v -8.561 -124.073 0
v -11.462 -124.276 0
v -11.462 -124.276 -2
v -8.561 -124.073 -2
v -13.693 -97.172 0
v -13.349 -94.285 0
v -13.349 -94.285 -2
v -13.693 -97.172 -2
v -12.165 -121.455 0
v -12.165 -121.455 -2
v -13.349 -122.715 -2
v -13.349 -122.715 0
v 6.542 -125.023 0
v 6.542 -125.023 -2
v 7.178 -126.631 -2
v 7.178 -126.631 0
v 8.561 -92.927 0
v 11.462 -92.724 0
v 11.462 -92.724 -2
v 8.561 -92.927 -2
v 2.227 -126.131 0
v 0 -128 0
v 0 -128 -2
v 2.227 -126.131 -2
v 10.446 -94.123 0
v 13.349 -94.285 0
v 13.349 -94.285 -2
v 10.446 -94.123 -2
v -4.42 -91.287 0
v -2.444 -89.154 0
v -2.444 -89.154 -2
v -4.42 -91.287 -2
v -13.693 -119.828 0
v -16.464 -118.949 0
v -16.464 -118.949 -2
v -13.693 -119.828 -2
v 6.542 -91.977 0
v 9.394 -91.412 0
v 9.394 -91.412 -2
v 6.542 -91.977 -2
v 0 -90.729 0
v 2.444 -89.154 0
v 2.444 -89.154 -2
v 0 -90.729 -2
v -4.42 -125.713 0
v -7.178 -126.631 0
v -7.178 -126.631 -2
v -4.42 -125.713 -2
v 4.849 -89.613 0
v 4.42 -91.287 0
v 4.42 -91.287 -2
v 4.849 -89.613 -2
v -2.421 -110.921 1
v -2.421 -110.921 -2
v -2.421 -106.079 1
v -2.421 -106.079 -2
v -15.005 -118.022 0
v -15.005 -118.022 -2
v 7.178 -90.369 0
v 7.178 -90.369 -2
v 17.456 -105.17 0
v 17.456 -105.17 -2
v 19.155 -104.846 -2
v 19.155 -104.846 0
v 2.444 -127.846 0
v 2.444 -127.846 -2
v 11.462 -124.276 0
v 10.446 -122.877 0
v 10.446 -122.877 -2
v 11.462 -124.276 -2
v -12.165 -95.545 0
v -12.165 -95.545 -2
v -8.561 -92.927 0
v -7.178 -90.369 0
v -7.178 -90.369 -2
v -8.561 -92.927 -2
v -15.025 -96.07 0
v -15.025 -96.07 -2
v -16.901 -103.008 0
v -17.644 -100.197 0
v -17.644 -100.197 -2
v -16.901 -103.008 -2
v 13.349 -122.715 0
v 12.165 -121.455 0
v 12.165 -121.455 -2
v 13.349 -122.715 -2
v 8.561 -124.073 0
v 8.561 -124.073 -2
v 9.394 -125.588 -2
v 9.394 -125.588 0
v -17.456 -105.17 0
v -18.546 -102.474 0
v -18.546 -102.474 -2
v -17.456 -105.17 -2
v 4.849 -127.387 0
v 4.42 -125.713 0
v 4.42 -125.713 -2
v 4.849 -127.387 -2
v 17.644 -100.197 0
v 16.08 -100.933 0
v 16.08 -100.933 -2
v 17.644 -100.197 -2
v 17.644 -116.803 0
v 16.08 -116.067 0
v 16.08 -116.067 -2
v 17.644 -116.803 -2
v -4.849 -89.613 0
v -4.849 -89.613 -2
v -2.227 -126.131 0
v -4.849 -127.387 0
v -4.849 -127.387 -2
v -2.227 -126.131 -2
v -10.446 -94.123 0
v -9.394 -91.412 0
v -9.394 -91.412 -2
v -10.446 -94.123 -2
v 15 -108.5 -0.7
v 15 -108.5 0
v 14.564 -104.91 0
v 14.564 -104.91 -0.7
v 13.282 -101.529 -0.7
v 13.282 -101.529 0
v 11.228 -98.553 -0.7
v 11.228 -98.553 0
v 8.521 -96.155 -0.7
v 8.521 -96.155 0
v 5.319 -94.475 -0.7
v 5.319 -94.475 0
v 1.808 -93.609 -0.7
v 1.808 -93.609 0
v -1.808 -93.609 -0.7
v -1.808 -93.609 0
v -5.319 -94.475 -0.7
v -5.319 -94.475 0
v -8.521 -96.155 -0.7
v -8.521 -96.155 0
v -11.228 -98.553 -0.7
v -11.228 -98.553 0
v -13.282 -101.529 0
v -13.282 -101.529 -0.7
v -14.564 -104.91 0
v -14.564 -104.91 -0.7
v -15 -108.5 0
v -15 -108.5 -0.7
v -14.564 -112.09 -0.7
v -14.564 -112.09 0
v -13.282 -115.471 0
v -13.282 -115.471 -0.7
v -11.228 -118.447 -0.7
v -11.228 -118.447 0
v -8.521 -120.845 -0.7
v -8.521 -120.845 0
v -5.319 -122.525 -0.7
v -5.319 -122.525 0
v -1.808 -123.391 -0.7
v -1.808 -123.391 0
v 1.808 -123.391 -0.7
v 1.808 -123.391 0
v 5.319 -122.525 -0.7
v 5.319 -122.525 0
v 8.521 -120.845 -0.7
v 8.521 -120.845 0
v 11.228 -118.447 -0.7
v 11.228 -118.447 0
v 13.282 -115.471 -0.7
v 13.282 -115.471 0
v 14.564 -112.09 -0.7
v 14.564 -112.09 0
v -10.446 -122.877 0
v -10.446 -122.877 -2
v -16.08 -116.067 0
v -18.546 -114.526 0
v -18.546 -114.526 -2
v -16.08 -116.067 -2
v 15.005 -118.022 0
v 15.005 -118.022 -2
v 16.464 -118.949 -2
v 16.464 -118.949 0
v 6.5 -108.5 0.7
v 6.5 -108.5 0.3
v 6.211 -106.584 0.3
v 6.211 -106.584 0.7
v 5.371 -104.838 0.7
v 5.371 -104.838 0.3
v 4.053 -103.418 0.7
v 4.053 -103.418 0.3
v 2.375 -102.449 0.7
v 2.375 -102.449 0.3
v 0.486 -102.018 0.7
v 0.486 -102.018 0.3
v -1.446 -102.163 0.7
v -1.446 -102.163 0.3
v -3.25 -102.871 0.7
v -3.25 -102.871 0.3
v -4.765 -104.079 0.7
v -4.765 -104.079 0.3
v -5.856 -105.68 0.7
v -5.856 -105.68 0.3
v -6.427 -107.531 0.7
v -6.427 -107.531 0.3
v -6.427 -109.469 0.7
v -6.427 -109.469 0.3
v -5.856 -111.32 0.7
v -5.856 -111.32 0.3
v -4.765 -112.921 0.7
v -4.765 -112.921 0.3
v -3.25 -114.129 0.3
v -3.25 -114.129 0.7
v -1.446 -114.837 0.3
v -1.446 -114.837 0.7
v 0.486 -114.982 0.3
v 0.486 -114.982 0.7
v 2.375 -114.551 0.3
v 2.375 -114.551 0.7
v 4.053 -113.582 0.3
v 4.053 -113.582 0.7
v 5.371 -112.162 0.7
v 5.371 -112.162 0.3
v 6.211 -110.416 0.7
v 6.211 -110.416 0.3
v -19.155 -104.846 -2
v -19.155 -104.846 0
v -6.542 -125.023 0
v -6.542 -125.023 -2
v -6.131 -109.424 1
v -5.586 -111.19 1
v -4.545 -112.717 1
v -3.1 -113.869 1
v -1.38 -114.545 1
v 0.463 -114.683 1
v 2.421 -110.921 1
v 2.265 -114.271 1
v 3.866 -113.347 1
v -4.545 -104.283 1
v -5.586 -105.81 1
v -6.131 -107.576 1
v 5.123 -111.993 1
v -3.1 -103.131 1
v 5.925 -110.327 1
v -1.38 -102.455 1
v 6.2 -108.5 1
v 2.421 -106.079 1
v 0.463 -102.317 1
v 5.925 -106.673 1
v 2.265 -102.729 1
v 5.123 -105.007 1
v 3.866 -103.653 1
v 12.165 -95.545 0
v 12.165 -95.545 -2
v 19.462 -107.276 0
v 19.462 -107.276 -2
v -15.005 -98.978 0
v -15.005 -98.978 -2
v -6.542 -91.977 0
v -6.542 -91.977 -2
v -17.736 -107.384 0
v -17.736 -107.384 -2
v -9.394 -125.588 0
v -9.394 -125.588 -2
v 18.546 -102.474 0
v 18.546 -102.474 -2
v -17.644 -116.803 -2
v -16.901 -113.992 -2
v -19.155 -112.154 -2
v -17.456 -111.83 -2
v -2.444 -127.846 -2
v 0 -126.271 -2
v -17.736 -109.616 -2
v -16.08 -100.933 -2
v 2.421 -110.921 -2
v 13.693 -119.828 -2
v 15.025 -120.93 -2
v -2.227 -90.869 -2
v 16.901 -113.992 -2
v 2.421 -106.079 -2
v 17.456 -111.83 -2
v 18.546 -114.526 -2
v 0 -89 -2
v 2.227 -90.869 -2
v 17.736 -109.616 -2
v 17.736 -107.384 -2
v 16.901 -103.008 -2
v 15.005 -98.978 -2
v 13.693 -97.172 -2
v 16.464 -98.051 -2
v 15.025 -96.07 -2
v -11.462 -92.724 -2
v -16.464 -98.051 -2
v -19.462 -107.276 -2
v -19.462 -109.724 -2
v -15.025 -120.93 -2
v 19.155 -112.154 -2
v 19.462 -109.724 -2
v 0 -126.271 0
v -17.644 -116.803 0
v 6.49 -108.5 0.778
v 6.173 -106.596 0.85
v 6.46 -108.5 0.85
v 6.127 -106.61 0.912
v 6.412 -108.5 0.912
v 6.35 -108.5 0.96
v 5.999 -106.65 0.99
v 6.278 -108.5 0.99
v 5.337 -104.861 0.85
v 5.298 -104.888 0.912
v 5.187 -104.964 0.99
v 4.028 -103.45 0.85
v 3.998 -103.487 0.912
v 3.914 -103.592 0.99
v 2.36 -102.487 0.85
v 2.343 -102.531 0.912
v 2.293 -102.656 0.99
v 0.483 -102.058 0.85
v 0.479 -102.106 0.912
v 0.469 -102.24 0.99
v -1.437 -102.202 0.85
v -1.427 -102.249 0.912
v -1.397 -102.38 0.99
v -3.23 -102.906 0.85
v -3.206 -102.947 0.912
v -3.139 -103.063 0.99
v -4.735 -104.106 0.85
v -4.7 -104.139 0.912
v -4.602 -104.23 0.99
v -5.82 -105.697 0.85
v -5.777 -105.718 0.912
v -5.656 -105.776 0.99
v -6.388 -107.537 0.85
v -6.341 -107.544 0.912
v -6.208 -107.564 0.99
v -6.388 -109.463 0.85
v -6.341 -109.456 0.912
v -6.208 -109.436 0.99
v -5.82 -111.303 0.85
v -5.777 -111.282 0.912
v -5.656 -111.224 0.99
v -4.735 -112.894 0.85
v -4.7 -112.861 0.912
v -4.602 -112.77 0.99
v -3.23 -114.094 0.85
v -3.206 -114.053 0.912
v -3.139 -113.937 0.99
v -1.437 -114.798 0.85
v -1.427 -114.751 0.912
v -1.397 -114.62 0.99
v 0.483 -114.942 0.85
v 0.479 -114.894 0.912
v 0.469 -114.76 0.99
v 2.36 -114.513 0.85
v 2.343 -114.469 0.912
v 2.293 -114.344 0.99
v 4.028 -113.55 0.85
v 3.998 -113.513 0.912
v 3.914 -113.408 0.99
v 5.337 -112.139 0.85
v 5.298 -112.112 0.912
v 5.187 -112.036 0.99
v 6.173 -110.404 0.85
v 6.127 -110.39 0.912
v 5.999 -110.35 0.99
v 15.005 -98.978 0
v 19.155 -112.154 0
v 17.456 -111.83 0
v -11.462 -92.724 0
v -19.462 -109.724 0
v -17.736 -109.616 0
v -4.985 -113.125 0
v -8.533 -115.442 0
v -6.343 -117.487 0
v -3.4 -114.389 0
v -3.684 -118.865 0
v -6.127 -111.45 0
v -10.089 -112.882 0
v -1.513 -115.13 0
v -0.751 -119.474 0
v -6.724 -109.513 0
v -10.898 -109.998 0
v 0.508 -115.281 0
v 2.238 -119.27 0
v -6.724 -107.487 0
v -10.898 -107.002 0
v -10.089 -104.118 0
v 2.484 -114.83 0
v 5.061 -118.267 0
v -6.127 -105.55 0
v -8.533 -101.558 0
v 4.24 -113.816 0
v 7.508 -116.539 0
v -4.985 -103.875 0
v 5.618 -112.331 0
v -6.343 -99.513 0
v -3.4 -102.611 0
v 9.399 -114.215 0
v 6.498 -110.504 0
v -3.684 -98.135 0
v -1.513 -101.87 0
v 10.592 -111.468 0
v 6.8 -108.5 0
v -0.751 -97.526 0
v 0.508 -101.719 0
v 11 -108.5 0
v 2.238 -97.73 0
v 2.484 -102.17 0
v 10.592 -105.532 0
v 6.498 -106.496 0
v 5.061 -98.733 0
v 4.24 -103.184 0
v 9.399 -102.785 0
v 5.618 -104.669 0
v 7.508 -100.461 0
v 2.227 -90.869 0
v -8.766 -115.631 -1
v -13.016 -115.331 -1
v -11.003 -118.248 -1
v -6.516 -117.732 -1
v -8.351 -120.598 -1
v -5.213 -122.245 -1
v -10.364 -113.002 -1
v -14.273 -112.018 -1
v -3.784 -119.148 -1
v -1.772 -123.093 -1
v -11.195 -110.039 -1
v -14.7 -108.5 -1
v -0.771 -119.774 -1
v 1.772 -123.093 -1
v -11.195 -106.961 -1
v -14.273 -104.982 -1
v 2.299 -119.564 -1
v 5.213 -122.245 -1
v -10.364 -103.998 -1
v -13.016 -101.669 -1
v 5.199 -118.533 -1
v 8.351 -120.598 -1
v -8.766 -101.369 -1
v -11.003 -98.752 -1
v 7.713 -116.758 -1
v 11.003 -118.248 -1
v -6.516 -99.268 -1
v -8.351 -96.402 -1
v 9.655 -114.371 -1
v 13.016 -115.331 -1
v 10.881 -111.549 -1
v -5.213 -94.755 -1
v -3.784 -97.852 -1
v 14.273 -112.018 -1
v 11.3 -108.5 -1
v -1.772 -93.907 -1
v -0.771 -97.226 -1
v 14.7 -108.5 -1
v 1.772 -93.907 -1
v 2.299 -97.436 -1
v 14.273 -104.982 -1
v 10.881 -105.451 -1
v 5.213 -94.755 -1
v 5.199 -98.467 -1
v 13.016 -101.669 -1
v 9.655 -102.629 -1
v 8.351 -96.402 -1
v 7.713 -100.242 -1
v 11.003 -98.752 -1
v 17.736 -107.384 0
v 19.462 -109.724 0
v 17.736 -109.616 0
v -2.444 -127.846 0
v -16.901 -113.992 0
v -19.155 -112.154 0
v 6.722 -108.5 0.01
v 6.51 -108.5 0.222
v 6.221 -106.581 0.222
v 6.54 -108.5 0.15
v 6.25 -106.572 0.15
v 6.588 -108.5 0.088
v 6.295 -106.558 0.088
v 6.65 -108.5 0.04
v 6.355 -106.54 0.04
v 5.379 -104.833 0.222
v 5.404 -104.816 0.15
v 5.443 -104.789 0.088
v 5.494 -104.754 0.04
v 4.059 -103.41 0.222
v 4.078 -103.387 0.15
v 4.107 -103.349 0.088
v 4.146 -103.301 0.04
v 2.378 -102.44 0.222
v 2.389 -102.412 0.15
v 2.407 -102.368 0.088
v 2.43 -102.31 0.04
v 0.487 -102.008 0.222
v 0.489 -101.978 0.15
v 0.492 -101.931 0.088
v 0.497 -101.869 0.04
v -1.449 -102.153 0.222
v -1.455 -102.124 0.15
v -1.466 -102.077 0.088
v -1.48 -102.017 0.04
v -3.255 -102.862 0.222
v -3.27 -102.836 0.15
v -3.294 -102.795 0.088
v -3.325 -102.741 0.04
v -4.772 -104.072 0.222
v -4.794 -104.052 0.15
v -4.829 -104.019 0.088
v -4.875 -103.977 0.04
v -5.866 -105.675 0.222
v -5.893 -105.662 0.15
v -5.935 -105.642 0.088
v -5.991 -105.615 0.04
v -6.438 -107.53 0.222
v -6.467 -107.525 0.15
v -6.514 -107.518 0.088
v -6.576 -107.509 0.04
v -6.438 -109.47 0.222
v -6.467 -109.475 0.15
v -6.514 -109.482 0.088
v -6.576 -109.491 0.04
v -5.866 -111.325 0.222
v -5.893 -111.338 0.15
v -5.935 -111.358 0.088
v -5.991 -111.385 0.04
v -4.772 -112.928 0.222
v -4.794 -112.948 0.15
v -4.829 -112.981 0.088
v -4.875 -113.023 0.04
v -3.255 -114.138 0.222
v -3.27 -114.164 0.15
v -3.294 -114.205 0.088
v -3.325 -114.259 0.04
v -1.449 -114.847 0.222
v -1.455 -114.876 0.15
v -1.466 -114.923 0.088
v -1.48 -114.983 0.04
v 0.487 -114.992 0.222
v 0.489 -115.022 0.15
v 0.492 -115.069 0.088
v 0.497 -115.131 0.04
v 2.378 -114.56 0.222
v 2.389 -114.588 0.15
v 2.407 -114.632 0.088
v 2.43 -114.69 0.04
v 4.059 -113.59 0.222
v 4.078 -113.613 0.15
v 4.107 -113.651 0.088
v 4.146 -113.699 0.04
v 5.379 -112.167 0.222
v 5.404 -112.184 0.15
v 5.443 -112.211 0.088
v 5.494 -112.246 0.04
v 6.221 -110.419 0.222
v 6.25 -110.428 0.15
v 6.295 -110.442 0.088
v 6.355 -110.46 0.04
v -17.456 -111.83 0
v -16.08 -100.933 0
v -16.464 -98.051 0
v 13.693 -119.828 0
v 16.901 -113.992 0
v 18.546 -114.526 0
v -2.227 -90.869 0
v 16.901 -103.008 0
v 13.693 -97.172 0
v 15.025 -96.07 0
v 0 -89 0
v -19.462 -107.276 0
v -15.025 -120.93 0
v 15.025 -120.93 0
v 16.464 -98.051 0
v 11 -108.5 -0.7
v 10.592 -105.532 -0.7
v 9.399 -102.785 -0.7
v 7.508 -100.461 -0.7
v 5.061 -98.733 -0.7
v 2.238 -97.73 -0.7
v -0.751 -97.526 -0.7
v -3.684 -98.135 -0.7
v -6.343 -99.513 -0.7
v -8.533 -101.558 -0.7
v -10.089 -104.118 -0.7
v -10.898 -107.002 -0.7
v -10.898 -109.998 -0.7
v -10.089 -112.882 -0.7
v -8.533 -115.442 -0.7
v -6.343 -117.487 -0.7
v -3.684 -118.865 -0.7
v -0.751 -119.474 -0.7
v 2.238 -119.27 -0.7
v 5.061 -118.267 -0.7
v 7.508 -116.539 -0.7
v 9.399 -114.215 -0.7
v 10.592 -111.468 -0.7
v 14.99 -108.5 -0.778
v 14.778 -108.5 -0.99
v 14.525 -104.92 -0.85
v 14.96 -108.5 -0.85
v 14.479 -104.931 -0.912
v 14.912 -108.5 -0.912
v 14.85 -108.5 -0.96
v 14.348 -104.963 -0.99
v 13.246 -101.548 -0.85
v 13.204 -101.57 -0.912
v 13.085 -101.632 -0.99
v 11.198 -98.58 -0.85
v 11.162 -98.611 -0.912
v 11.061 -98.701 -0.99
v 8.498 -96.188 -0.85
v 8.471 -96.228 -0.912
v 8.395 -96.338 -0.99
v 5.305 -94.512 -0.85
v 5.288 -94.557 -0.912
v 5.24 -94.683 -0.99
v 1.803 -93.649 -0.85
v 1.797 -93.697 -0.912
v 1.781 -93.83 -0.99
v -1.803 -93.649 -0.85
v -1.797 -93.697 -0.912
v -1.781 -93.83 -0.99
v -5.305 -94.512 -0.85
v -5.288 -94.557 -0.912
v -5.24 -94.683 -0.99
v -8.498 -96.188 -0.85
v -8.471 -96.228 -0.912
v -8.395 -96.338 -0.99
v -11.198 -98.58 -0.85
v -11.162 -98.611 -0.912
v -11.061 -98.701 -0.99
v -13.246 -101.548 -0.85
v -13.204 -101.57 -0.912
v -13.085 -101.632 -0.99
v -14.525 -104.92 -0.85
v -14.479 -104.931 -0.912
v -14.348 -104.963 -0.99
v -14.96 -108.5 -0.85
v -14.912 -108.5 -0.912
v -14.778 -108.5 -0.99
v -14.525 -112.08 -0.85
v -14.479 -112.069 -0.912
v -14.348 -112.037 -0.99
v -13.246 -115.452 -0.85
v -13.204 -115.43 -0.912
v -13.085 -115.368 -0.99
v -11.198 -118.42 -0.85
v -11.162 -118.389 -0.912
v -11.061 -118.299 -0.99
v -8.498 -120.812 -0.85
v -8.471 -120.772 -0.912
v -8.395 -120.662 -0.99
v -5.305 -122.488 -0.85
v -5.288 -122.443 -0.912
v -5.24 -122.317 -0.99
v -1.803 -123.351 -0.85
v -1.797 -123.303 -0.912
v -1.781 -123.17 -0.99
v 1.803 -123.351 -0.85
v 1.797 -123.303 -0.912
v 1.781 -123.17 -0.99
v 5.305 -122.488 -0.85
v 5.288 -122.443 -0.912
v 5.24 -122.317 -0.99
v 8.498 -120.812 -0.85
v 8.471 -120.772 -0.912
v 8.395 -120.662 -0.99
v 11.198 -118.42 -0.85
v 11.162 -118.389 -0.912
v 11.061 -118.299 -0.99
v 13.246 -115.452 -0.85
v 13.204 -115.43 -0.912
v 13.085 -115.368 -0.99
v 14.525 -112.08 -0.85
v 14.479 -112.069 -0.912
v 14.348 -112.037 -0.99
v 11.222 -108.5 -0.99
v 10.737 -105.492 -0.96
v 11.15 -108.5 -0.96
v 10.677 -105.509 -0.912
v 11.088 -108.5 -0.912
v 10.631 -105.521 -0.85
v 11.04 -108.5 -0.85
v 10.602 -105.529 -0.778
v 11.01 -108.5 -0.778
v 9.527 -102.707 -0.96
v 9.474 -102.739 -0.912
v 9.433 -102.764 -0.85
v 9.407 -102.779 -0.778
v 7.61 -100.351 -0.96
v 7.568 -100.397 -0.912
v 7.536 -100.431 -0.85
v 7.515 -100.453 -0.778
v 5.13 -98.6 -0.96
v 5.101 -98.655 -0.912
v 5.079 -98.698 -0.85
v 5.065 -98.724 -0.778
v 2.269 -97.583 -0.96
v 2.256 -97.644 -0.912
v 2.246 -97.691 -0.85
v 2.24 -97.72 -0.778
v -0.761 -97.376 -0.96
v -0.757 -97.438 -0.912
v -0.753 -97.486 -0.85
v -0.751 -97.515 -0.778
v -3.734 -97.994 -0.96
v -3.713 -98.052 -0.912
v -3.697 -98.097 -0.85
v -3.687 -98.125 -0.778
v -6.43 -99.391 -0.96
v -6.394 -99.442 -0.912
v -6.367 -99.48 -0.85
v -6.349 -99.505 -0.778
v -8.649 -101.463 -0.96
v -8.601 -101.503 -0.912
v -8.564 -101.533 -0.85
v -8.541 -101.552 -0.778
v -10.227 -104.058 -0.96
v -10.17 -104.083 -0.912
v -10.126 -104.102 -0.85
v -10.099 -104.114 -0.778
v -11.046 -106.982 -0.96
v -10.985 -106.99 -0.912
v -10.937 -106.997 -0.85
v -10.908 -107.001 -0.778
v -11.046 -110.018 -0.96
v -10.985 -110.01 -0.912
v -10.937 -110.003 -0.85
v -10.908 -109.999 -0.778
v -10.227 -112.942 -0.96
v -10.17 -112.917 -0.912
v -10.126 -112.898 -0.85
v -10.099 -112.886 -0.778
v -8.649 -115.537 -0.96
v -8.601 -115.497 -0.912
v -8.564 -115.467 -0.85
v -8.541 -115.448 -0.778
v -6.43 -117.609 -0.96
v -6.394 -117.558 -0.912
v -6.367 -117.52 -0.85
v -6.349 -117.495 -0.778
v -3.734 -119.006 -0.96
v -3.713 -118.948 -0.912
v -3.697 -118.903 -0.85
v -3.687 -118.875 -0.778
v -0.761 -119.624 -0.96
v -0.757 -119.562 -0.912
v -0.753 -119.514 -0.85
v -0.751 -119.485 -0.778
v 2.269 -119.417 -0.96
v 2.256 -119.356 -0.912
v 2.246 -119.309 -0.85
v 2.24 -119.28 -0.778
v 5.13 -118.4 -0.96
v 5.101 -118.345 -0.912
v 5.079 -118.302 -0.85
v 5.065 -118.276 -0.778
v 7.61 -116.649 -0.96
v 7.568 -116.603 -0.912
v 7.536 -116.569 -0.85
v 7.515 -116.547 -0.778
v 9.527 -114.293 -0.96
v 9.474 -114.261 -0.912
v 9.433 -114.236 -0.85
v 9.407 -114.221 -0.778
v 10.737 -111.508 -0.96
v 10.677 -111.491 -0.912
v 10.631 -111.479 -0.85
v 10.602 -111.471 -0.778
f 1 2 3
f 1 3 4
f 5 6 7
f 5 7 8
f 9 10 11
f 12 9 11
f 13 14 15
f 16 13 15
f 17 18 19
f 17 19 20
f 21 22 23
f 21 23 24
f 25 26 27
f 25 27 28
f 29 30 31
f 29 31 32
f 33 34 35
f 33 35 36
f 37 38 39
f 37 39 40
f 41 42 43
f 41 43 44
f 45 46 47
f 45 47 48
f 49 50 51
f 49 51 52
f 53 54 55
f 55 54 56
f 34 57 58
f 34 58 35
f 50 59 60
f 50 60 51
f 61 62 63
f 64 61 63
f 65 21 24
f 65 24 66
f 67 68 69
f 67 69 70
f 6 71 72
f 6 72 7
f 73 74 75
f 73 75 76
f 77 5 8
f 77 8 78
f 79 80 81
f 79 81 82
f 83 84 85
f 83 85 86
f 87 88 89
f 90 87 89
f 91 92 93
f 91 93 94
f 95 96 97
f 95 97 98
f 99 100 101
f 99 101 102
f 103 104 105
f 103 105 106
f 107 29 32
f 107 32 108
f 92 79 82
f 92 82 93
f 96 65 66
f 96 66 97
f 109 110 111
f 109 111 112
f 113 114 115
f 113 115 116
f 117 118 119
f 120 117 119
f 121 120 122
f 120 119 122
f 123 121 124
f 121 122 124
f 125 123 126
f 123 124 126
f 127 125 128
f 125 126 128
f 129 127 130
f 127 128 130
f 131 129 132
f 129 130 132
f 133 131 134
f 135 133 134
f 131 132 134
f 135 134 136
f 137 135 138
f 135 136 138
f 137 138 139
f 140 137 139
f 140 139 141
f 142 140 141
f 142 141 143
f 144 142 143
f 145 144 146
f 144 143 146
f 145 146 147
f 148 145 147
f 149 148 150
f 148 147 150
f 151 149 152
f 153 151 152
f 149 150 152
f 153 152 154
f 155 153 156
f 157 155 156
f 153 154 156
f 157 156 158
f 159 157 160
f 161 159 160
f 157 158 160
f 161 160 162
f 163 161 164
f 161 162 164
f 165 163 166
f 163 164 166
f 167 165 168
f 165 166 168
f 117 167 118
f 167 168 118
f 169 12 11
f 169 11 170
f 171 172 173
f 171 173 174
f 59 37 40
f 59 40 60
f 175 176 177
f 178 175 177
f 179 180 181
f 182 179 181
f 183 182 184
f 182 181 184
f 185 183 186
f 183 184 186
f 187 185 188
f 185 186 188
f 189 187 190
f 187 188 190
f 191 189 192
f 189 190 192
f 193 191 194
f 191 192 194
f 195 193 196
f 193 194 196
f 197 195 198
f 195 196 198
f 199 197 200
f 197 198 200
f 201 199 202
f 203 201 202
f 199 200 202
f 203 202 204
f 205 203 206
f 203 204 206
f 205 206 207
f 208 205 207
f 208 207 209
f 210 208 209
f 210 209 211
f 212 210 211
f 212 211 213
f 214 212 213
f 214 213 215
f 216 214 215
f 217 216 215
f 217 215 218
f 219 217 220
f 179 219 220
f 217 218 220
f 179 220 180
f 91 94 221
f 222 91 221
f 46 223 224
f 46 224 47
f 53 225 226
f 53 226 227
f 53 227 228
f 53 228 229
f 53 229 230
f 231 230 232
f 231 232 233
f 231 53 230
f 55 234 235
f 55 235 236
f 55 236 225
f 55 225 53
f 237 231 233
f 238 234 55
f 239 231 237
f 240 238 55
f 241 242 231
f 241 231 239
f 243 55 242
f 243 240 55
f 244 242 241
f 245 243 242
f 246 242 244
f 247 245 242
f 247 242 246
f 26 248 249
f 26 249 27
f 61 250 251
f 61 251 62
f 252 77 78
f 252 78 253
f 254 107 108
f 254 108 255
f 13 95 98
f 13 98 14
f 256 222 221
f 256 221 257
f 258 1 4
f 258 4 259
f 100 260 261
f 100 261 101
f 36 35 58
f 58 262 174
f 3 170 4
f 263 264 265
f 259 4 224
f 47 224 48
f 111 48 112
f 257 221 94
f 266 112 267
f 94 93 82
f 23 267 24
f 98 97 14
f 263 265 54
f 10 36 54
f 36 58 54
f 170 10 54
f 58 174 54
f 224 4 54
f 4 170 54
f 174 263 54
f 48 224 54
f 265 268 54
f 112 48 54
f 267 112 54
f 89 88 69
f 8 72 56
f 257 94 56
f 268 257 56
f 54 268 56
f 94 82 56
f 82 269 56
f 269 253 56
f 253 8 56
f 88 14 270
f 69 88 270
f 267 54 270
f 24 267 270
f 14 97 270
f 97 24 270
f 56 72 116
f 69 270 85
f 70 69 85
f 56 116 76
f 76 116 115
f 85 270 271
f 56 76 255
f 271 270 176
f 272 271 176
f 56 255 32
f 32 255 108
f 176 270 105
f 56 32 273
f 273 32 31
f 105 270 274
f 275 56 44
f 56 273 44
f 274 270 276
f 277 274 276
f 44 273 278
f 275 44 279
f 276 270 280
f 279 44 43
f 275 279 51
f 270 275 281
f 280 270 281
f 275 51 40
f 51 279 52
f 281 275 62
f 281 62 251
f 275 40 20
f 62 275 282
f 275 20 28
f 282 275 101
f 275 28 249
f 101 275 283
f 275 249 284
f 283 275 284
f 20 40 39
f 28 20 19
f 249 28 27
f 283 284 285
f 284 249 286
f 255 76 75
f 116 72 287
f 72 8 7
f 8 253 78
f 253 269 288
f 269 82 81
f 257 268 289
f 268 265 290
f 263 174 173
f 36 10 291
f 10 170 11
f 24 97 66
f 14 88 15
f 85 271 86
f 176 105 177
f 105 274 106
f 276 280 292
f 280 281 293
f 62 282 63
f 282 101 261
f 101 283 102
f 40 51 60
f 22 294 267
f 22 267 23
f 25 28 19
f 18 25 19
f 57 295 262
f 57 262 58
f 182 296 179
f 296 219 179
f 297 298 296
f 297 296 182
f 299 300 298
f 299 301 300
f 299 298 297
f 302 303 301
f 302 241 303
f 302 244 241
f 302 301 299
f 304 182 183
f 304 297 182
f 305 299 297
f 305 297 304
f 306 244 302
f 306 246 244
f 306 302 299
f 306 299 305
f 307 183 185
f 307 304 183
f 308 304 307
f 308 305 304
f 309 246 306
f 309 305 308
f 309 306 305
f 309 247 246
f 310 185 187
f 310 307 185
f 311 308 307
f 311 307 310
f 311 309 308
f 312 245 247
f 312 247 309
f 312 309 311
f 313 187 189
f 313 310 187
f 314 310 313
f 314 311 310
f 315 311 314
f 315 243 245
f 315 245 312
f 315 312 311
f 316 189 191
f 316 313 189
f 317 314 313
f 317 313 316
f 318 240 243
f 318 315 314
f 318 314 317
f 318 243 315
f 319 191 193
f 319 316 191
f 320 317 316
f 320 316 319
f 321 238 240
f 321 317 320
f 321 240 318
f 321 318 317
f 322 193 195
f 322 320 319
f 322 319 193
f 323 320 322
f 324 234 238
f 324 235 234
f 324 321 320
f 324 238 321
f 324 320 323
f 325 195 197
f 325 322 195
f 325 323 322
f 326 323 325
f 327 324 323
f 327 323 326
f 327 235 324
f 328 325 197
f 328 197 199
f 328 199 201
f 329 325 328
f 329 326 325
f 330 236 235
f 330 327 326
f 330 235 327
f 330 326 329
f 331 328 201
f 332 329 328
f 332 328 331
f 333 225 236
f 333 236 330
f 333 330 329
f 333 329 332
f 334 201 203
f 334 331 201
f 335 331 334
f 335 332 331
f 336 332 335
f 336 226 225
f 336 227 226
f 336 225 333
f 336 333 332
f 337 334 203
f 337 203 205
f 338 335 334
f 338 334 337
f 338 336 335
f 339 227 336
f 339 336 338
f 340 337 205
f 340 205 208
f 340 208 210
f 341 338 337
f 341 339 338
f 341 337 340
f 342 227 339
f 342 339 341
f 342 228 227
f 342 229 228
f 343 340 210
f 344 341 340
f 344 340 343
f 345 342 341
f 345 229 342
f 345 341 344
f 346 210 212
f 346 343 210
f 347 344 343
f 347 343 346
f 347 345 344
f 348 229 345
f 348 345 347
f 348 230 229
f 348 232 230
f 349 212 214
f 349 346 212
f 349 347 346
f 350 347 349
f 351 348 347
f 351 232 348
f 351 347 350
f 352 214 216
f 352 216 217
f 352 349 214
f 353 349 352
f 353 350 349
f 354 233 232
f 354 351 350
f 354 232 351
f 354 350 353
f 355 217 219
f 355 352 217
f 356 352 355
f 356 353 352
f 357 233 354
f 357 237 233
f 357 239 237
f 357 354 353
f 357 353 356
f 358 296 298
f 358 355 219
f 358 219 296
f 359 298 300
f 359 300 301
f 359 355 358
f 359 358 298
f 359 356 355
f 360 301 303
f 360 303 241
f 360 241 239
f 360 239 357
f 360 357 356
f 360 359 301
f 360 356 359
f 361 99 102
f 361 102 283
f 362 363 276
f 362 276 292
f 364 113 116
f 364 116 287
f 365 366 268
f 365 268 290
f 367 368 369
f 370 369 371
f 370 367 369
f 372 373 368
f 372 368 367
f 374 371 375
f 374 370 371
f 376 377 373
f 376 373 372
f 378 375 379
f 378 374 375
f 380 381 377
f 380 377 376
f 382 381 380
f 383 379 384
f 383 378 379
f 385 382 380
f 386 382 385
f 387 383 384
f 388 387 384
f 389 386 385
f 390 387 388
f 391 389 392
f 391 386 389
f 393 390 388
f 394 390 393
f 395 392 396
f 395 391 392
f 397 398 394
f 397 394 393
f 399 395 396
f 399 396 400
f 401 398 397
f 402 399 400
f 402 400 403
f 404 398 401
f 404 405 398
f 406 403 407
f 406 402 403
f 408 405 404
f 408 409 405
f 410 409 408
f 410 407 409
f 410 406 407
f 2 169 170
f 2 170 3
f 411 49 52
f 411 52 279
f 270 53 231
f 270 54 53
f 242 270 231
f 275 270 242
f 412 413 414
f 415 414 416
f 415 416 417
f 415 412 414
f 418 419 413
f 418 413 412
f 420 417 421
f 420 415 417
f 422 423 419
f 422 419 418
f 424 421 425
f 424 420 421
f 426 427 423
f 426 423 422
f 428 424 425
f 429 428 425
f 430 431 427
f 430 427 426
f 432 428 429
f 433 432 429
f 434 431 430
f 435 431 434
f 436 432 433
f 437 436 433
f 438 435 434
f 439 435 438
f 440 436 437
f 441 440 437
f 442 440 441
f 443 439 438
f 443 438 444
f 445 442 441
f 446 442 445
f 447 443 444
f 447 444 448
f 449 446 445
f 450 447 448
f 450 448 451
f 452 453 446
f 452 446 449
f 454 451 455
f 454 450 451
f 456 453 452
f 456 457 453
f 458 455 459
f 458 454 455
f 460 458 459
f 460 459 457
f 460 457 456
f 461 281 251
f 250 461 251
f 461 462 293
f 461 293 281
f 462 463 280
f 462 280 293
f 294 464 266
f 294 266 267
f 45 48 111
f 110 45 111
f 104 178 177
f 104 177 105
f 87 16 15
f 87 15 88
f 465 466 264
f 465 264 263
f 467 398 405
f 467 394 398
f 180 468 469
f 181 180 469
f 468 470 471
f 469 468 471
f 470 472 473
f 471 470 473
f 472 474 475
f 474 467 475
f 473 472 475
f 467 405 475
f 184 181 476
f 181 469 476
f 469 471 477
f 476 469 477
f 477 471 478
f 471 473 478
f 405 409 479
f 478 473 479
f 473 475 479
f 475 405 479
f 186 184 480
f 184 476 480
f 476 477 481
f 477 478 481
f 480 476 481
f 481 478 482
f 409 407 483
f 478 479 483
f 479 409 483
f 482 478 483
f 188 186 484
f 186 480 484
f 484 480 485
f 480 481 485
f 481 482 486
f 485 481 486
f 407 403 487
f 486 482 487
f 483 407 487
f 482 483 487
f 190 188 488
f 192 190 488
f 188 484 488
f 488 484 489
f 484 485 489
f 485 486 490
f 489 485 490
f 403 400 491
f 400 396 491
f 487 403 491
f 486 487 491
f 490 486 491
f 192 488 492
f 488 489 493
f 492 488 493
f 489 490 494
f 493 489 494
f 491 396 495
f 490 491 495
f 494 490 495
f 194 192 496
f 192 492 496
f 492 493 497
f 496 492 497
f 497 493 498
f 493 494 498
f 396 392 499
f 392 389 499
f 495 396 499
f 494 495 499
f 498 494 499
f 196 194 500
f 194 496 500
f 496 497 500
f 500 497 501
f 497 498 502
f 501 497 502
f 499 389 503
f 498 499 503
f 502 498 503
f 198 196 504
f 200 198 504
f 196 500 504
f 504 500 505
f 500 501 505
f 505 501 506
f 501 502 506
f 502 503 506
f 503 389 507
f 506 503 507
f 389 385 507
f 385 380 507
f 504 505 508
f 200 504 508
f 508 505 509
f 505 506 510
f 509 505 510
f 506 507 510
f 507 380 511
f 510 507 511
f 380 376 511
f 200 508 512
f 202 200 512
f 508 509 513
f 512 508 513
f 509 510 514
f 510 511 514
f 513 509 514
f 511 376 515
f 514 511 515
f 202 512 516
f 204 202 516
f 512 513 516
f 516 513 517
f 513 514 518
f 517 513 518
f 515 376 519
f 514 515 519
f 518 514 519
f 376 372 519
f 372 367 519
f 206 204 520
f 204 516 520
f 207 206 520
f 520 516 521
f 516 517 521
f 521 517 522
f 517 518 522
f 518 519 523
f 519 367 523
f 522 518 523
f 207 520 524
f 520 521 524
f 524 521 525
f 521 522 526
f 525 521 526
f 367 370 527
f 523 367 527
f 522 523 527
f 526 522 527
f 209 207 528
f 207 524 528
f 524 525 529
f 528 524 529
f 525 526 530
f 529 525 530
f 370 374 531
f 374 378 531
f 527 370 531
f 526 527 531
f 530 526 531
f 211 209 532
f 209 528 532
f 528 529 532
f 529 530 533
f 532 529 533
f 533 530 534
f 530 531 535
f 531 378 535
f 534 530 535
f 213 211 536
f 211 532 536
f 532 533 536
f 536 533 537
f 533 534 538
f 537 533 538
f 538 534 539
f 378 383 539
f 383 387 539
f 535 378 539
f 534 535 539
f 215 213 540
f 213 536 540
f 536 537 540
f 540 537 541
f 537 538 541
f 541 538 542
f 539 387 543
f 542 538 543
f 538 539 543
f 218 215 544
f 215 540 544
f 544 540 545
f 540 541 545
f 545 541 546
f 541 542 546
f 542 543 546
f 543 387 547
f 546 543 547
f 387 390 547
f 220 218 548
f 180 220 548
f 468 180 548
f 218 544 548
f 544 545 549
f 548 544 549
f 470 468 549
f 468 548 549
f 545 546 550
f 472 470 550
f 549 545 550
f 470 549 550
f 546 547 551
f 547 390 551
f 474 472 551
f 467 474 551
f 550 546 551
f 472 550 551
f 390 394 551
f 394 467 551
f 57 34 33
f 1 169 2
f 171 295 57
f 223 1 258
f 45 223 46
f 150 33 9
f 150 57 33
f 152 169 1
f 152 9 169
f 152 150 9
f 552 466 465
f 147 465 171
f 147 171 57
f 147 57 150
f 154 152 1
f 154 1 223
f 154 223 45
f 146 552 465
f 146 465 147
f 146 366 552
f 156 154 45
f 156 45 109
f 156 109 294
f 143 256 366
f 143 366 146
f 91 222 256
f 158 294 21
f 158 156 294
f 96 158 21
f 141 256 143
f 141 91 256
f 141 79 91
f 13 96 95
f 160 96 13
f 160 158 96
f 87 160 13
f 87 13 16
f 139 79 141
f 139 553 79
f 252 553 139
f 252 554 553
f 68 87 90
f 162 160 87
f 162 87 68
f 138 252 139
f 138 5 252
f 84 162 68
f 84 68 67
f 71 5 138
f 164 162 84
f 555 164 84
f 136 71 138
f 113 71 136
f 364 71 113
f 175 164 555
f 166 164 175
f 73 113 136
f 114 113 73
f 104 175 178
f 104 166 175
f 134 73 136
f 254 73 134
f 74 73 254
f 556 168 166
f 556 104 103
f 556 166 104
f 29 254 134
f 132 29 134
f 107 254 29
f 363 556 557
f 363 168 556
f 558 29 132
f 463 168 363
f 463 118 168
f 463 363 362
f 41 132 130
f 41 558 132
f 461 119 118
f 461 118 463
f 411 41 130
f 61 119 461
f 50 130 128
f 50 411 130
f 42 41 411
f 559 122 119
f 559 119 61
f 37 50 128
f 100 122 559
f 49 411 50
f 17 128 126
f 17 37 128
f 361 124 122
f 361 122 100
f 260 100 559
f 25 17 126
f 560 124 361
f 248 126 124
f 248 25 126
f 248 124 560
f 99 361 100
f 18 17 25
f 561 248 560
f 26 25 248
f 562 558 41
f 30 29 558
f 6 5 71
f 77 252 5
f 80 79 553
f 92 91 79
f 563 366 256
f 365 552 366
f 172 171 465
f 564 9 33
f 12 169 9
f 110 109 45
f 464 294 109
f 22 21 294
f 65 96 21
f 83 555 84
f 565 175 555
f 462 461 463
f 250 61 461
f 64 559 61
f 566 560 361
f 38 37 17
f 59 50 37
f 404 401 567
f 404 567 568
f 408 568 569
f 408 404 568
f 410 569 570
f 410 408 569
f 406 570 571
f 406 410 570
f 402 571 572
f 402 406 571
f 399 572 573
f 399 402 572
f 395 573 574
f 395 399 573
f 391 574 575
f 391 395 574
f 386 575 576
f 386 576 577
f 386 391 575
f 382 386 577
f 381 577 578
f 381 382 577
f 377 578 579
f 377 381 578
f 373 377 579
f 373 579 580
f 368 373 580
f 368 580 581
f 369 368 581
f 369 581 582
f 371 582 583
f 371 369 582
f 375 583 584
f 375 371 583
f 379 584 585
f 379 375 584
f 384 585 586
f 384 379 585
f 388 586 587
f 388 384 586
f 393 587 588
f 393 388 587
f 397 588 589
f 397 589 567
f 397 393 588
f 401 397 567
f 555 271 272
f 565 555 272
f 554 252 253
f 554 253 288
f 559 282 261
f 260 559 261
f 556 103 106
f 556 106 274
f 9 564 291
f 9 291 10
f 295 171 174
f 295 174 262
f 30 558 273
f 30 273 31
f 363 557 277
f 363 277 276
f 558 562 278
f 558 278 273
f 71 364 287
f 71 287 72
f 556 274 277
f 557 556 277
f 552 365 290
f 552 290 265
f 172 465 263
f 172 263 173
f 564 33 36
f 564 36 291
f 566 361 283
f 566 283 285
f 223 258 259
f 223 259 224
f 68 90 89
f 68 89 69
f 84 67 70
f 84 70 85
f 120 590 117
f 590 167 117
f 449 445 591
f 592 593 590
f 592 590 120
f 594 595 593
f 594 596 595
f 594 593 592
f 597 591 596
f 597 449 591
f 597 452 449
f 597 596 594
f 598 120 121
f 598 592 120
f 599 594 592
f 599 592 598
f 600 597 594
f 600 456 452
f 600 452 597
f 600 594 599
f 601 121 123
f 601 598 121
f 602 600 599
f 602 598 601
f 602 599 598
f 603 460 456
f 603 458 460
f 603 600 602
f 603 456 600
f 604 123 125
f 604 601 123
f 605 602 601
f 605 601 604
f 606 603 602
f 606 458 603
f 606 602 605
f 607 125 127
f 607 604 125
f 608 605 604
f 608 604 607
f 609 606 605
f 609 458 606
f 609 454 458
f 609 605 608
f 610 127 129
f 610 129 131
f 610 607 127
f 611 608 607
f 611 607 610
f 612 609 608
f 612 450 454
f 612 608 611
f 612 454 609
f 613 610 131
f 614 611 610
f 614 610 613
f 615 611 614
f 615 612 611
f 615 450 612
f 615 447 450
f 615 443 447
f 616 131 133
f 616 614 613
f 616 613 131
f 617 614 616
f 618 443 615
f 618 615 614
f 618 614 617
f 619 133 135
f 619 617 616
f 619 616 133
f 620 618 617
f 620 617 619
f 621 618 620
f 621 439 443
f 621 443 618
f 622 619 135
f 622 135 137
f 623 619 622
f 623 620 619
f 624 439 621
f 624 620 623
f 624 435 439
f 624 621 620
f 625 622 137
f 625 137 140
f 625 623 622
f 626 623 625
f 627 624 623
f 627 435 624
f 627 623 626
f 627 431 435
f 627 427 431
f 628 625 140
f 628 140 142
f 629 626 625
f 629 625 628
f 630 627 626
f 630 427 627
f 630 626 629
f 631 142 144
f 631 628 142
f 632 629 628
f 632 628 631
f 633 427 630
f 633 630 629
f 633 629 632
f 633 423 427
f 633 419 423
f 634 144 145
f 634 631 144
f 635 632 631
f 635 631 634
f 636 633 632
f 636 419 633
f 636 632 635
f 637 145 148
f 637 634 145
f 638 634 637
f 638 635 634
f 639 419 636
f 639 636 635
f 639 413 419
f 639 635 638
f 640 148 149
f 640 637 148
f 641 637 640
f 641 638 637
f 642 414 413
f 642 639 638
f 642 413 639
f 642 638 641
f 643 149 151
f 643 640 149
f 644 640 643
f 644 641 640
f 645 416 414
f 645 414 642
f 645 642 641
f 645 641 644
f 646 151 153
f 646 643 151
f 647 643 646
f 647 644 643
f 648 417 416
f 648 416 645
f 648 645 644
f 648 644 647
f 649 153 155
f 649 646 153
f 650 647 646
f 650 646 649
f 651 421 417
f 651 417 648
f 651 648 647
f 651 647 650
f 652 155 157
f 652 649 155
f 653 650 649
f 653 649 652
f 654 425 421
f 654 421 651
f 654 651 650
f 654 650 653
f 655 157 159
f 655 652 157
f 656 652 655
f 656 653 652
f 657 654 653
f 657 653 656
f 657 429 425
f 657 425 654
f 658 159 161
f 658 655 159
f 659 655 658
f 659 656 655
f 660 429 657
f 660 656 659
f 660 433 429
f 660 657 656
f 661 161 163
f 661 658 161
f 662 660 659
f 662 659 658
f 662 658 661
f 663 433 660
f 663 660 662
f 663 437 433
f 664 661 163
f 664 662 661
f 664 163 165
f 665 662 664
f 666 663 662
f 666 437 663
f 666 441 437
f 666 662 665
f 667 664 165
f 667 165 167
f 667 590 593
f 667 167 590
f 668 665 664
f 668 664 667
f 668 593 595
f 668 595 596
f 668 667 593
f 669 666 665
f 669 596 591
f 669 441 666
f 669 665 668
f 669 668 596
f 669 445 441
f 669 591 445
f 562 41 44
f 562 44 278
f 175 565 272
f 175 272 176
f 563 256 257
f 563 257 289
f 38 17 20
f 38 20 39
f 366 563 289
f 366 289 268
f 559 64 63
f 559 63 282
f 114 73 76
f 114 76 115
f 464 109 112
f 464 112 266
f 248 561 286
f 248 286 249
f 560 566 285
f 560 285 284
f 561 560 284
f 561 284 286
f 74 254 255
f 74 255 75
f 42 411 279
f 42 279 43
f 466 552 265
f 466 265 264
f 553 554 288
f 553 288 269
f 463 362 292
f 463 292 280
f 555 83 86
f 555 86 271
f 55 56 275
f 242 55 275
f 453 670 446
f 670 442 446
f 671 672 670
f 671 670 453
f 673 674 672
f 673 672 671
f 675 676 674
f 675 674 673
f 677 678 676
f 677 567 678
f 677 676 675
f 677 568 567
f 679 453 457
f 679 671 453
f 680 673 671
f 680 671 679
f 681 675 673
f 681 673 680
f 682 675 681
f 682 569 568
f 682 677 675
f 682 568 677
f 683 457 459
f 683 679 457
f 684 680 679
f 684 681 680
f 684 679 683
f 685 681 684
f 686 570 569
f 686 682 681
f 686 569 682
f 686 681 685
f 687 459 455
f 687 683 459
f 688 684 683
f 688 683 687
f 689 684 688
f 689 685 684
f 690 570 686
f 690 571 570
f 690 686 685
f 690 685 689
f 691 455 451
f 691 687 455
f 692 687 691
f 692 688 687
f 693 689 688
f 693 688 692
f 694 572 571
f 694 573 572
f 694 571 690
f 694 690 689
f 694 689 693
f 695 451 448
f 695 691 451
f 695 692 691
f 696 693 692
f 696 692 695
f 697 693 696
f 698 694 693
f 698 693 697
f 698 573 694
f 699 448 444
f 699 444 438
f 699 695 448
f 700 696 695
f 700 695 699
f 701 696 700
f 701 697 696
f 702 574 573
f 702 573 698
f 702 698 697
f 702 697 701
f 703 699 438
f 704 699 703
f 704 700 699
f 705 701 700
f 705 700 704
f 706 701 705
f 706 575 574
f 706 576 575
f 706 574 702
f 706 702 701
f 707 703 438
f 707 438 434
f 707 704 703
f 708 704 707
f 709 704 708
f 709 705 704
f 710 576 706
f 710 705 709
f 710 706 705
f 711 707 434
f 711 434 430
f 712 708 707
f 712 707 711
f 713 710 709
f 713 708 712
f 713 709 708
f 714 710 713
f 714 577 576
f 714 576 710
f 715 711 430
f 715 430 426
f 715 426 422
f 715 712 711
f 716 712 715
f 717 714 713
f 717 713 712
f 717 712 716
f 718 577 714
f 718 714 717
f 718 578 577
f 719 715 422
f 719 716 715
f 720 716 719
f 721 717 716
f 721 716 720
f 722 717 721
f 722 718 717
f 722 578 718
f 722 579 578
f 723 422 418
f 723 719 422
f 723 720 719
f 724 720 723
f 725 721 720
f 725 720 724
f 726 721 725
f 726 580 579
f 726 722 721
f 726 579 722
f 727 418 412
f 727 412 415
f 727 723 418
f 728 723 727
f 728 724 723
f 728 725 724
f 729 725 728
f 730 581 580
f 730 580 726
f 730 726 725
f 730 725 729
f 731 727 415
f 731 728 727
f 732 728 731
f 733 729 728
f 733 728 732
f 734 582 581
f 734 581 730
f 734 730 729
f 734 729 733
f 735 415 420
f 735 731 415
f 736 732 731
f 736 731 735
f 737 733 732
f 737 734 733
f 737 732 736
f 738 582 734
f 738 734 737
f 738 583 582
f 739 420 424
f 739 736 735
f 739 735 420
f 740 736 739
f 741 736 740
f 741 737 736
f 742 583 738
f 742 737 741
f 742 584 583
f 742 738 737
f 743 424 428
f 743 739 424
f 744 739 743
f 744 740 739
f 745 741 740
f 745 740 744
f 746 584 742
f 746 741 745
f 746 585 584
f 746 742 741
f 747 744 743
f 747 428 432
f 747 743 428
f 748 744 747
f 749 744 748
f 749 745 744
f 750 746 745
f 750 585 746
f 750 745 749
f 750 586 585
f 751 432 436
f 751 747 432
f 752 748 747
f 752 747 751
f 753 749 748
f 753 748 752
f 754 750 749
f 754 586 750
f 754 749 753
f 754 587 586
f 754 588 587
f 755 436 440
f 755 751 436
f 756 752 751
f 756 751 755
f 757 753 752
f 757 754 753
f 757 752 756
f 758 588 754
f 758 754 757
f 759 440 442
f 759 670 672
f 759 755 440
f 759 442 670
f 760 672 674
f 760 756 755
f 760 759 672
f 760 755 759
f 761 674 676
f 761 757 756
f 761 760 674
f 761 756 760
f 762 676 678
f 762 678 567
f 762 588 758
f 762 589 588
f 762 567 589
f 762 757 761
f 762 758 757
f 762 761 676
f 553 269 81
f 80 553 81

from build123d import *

# Parameters (mm, degrees)
BOSS_EXTRUDE1_DEPTH = 2
CIRPATTERN1_COUNT   = 50
SKETCH3_W           = 4.842640688
SKETCH3_H           = 4.842640688
CUT_EXTRUDE2_DEPTH  = 3
SKETCH4_R           = 15
SKETCH4_R_2         = 11
CUT_EXTRUDE3_DEPTH  = 1
SKETCH5_R           = 6.5
SKETCH5_W           = 4.842640688
SKETCH5_H           = 4.842640688
BOSS_EXTRUDE2_DEPTH = 1
FILLET1_R           = 0.3


with BuildPart() as part:
    # Sketch2 → Boss-Extrude1 (new body)
    with BuildSketch(Plane.XY):
        with BuildLine():
            Line((0, -91), (0, -89))
            Line((0, -89), (-2.618249578, -91.196972255))
            ThreePointArc((-2.618249578, -91.196972255), (1.312824143, -125.950687458), (0, -91))
        make_face()
    boss_extrude1 = extrude(amount=-BOSS_EXTRUDE1_DEPTH)

    # CirPattern1: Boss-Extrude1 ×50 about axis
    cirpattern1_axis = Axis((0, -108.5, 0), (0, 0, 1))
    for i in range(1, CIRPATTERN1_COUNT):
        add(boss_extrude1.rotate(cirpattern1_axis, i * 360 / CIRPATTERN1_COUNT))

    # Sketch3 → Cut-Extrude2 (cut, through all)
    with BuildSketch(Plane.XY):
        with Locations((0, -108.5)):
            Rectangle(SKETCH3_W, SKETCH3_H)
    extrude(amount=-CUT_EXTRUDE2_DEPTH, mode=Mode.SUBTRACT)

    # Sketch4 → Cut-Extrude3 (cut)
    with BuildSketch(Plane.XY):
        with Locations((0, -108.5)):
            Circle(SKETCH4_R)
        with Locations((0, -108.5)):
            Circle(SKETCH4_R_2, mode=Mode.SUBTRACT)
    extrude(amount=-CUT_EXTRUDE3_DEPTH, mode=Mode.SUBTRACT)

    # Sketch5 → Boss-Extrude2 (add)
    with BuildSketch(Plane.XY):
        with Locations((0, -108.5)):
            Circle(SKETCH5_R)
        with Locations((0, -108.5)):
            Rectangle(SKETCH5_W, SKETCH5_H, mode=Mode.SUBTRACT)
    extrude(amount=BOSS_EXTRUDE2_DEPTH)

    # Fillet1
    fillet1_edges = [part.edges().sort_by_distance(p)[0] for p in [
        (-15, -108.5, -1),
        (-11, -108.5, -1),
        (-6.5, -108.5, 1),
        (-6.5, -108.5, 0),
    ]]
    fillet(fillet1_edges, radius=FILLET1_R)


solid = part.part
